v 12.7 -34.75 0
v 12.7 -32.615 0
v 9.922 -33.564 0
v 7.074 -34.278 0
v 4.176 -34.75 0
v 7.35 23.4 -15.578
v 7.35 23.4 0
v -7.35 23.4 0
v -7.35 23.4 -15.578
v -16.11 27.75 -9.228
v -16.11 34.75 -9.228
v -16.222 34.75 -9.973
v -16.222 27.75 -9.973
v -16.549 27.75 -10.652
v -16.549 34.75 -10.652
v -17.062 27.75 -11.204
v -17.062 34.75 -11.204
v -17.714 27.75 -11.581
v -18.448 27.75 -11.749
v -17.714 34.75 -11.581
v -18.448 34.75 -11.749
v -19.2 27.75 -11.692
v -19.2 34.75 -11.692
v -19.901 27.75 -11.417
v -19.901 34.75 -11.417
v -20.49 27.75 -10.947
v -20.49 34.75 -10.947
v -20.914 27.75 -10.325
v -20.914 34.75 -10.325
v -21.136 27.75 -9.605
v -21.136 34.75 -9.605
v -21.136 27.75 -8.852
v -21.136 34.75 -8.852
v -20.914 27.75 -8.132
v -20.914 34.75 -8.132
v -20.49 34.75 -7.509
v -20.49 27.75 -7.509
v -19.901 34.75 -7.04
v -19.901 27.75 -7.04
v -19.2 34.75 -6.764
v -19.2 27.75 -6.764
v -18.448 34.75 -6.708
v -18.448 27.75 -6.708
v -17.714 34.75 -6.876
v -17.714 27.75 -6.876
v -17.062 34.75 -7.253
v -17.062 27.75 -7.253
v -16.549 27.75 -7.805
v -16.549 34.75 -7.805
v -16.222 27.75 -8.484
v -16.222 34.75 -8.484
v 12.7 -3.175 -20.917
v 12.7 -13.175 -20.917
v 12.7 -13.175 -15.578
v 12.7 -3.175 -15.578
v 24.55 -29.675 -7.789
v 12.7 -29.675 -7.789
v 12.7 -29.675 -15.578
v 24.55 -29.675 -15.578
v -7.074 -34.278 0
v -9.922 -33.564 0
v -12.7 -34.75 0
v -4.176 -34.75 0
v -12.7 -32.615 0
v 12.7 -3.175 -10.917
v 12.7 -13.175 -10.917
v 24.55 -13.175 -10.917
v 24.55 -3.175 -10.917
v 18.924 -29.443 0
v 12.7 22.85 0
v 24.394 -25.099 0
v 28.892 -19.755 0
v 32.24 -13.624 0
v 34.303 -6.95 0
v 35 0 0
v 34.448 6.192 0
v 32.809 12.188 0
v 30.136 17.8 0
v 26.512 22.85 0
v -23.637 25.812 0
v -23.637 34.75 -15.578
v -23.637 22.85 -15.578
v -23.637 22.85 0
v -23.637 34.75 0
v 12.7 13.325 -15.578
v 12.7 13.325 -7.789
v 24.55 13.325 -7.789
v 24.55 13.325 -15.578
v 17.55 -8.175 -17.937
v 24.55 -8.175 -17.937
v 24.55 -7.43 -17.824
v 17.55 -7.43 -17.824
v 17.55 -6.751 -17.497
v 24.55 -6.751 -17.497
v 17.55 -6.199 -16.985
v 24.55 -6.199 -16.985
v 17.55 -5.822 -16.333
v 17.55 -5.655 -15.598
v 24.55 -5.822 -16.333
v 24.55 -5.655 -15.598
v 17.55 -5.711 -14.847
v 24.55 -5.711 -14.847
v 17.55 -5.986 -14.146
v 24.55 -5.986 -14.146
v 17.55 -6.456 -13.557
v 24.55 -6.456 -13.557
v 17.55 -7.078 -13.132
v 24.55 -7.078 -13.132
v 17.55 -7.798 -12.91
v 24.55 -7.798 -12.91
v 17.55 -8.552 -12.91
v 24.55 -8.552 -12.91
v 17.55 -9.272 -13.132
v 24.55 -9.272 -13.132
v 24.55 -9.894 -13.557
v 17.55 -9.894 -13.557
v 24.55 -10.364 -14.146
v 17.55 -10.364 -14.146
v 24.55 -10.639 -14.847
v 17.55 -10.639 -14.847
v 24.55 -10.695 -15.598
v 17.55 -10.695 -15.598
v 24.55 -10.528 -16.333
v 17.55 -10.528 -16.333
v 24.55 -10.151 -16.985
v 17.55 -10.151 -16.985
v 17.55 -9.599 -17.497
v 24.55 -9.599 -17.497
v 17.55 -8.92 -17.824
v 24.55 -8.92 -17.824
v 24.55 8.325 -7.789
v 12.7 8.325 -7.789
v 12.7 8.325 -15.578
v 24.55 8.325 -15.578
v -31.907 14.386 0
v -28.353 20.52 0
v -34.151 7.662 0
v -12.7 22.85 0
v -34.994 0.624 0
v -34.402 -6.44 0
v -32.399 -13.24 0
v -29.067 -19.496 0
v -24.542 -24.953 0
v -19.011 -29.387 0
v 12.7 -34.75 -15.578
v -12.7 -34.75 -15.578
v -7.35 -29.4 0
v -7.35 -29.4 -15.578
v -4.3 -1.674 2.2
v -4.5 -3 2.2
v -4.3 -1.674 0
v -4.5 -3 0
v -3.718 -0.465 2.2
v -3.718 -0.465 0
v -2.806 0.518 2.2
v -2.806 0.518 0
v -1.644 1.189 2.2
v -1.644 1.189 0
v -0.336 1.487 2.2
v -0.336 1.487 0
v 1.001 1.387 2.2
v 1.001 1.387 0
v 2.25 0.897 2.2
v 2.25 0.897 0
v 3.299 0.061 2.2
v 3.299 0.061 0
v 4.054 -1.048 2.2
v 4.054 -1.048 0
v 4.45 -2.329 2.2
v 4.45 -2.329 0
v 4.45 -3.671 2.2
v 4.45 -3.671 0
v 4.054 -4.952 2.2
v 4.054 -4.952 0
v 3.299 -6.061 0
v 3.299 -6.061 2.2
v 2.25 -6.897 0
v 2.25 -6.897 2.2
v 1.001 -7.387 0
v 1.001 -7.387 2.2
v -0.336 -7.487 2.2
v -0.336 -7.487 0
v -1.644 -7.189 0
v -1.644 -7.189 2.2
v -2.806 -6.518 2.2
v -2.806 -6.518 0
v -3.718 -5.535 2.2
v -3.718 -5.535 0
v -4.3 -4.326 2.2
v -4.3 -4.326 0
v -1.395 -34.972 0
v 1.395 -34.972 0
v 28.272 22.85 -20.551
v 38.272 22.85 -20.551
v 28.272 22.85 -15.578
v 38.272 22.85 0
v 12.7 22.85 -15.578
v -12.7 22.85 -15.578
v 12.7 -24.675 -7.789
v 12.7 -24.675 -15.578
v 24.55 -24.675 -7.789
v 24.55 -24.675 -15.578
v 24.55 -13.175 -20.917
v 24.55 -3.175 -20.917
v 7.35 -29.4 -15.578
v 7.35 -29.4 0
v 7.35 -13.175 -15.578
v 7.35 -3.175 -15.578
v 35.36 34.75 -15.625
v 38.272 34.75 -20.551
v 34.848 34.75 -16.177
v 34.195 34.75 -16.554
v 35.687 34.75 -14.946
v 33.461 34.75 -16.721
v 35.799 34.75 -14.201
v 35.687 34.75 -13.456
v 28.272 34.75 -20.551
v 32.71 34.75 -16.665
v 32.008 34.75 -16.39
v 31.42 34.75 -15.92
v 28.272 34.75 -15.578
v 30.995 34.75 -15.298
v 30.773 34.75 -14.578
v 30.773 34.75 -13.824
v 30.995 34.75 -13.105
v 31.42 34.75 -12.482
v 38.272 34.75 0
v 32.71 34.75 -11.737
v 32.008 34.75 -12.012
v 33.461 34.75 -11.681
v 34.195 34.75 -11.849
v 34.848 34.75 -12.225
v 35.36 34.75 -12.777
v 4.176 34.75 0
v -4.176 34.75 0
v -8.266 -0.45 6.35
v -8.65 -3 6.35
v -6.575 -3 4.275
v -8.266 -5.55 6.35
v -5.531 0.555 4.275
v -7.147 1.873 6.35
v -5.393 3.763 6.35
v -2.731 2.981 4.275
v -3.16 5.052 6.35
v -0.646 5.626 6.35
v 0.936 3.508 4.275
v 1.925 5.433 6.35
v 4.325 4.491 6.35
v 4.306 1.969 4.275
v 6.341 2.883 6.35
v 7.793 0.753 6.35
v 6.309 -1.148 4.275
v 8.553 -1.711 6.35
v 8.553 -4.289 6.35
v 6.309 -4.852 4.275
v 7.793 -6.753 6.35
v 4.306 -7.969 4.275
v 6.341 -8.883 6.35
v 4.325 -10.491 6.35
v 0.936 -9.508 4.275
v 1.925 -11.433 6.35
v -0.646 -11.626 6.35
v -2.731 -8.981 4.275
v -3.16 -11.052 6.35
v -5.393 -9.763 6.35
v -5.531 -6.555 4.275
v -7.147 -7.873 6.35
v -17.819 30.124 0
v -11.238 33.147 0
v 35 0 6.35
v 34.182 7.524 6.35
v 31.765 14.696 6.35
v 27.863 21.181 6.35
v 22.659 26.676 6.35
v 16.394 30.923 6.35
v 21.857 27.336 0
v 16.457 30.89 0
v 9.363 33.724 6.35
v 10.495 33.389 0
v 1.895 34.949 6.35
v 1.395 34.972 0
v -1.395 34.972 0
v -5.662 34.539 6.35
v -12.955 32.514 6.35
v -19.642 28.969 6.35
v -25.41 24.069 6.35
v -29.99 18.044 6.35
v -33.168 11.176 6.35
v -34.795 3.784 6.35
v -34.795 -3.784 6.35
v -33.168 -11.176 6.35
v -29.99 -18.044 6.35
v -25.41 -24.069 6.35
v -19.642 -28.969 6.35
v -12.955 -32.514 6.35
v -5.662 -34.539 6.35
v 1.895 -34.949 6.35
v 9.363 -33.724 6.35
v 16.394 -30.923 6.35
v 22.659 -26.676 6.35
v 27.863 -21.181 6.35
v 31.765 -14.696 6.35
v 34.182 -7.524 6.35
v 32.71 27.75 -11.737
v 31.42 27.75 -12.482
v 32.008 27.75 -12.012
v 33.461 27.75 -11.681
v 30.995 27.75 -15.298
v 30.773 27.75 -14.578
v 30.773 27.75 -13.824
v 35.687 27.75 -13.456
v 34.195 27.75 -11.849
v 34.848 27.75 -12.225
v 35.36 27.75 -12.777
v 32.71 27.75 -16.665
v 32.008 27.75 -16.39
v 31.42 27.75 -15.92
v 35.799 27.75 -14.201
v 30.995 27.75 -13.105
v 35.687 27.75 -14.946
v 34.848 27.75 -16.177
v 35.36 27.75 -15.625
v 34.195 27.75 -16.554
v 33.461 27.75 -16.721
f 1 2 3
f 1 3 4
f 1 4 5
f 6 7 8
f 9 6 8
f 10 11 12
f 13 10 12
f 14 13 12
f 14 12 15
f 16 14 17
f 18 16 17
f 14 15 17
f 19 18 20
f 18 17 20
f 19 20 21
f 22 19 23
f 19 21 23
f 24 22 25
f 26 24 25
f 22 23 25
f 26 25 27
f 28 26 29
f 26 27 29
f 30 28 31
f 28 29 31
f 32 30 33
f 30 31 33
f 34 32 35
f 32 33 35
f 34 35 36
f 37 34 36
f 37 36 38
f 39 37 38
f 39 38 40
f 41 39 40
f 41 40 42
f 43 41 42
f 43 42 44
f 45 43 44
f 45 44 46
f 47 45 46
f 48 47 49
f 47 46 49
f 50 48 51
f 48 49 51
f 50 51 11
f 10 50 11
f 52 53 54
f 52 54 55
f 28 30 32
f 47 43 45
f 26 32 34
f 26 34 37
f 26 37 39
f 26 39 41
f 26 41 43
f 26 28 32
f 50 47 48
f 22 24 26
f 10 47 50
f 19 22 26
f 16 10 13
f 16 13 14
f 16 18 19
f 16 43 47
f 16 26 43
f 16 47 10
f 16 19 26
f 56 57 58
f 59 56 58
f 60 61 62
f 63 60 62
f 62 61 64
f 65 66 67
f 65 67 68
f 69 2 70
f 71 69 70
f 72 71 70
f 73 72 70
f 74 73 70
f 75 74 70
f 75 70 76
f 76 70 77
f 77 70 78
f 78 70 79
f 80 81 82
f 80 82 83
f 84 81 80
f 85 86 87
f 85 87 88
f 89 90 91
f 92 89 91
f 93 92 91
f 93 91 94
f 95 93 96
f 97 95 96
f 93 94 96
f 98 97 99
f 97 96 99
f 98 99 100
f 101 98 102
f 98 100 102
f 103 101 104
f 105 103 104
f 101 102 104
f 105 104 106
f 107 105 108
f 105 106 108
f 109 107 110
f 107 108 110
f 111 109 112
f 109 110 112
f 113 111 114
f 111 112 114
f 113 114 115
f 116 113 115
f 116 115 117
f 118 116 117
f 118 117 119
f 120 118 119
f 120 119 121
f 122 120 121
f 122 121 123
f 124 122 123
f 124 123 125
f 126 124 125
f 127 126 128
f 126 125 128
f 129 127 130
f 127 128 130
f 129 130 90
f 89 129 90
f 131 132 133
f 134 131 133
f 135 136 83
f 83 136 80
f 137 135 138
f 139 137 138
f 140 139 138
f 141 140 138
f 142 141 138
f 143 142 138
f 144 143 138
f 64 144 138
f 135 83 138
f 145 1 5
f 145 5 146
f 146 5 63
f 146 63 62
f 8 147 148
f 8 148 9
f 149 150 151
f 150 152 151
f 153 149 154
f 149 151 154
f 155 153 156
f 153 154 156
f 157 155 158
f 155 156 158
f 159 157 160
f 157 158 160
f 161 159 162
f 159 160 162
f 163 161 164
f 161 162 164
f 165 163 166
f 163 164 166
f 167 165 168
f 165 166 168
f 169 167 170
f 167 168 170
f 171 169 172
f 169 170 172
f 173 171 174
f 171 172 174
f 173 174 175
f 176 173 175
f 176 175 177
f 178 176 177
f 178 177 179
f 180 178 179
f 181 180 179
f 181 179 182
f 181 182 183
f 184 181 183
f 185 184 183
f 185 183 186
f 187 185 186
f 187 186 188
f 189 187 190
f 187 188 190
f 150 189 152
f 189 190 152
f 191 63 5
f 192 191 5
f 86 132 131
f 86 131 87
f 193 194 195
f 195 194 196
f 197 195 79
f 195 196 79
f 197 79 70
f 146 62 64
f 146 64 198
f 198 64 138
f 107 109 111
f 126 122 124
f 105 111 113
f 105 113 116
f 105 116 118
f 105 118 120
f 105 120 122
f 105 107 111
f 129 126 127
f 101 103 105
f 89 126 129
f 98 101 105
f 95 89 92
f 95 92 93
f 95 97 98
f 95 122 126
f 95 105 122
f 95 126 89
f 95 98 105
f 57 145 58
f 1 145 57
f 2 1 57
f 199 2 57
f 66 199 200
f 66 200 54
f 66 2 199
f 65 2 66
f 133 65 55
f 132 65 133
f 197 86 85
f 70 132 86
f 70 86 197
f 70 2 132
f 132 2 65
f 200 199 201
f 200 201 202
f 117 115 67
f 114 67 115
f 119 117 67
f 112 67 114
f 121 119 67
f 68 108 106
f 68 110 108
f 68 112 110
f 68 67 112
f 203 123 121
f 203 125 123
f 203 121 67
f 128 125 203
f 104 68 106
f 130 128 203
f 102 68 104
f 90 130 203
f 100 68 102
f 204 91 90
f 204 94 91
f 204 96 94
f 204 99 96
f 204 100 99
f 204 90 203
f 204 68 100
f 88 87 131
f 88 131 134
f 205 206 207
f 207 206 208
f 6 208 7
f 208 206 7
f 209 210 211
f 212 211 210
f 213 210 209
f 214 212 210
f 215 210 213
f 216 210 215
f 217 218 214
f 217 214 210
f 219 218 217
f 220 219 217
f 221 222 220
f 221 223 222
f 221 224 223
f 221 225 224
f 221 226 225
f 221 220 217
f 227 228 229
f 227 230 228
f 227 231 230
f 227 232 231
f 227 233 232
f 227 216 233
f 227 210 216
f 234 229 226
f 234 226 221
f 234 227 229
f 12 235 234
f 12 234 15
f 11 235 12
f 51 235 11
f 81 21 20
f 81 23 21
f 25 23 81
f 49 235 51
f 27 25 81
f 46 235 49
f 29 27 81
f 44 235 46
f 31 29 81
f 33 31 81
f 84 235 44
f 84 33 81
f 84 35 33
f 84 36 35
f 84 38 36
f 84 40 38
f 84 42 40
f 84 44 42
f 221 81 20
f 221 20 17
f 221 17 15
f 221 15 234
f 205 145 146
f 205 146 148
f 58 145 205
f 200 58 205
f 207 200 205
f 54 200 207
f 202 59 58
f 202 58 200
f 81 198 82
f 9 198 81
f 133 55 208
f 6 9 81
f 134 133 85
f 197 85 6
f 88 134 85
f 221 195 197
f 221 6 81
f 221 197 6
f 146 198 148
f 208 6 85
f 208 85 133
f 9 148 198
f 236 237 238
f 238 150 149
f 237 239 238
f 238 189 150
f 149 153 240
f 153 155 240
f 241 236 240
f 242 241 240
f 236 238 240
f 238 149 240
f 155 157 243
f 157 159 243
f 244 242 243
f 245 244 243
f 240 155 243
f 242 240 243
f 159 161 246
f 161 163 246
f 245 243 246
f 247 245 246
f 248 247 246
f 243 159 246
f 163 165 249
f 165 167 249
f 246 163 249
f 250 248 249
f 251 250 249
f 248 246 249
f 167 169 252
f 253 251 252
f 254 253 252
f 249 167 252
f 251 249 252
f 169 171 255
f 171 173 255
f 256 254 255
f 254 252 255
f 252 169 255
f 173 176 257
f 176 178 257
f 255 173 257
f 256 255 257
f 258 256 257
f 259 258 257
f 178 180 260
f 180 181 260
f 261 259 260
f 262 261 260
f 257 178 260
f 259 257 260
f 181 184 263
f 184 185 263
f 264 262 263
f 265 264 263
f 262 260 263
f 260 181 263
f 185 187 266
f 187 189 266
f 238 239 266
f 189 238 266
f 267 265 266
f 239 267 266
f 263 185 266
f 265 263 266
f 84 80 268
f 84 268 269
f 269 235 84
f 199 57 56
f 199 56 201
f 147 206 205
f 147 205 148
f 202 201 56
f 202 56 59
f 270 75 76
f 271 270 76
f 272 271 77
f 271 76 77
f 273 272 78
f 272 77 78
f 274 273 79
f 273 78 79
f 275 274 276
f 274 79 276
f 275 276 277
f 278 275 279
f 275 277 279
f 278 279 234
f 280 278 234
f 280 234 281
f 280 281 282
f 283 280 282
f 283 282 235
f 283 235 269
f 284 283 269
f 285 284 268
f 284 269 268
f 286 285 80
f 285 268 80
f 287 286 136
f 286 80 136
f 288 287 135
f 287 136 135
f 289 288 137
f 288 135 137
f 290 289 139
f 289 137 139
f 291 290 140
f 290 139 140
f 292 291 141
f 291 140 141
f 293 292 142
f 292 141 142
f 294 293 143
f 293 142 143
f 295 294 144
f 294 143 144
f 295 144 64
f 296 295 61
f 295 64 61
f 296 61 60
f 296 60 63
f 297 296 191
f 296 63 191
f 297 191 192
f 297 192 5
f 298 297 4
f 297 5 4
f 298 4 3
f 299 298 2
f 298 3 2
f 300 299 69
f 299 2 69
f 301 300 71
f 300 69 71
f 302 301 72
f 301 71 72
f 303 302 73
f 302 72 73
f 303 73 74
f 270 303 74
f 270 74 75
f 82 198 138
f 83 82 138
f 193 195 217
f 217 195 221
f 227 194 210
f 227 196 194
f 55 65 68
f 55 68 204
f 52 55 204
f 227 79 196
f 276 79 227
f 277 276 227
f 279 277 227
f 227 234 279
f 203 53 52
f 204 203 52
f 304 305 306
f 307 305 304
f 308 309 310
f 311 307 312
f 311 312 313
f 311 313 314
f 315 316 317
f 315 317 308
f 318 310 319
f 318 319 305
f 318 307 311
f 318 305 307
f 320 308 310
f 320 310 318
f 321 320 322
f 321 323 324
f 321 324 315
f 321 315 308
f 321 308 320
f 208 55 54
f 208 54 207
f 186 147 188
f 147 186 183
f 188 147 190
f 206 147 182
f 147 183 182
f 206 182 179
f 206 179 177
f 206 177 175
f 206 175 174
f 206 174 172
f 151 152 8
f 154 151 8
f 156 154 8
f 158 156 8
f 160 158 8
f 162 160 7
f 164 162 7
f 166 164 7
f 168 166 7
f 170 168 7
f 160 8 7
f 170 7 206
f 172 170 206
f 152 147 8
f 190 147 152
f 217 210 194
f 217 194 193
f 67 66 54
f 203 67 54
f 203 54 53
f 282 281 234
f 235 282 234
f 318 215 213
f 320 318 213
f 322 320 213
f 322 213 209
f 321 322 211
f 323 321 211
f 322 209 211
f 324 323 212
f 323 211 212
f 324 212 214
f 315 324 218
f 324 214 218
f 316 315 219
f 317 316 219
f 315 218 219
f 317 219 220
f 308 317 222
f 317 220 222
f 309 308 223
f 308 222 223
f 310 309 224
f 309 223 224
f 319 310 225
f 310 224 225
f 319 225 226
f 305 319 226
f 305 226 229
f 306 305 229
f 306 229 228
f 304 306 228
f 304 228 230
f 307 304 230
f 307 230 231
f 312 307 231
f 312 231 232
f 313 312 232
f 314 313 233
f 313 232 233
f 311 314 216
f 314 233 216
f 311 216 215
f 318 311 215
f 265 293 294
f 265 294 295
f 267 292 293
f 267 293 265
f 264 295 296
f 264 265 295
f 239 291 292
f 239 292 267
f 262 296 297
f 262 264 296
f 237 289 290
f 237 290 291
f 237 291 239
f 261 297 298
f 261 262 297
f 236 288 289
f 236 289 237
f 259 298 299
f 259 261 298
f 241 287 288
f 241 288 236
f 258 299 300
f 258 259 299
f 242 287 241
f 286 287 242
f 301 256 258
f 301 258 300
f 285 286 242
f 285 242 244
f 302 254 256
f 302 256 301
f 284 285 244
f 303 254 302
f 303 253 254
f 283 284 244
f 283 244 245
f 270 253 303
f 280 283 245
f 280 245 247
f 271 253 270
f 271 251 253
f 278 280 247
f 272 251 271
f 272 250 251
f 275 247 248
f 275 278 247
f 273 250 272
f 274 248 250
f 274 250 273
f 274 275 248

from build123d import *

# Parameters (mm, degrees)
SKETCH1_R                                       = 35
BOSS_EXTRUDE1_DEPTH                             = 6.35
SKETCH2_W                                       = 25.4
SKETCH2_H                                       = 69.5
SKETCH2_W_2                                     = 14.7
SKETCH2_H_2                                     = 52.8
BOSS_EXTRUDE2_DEPTH                             = 15.578435
CSK_FOR_M8_FLAT_HEAD_MACHINE_SCREW1_D           = 9
CSK_FOR_M8_FLAT_HEAD_MACHINE_SCREW1_DEPTH       = 17.5
CSK_FOR_M8_FLAT_HEAD_MACHINE_SCREW1_CSINK_D     = 17.3
CSK_FOR_M8_FLAT_HEAD_MACHINE_SCREW1_CSINK_ANGLE = 90
CSK_FOR_M8_FLAT_HEAD_MACHINE_SCREW1_TIP         = 2.703872786
SKETCH6_W                                       = 15.578435
SKETCH6_H                                       = 11.9
BOSS_EXTRUDE3_DEPTH                             = 25.572145
SKETCH7_W                                       = 15.578435
SKETCH7_H                                       = 11.9
BOSS_EXTRUDE4_DEPTH                             = 10.937286
SKETCH8_R                                       = 2.5273
CUT_EXTRUDE1_DEPTH                              = 7
SKETCH9_W                                       = 10
SKETCH9_H                                       = 11.9
BOSS_EXTRUDE5_DEPTH                             = 4.972688
SKETCH10_R                                      = 2.5273
CUT_EXTRUDE2_DEPTH                              = 7
SKETCH11_W                                      = 5.3384196
SKETCH11_H                                      = 10
BOSS_EXTRUDE6_DEPTH                             = 5.35
SKETCH12_W                                      = 10
SKETCH12_H                                      = 10
SKETCH12_W_2                                    = 7.789222
SKETCH12_H_2                                    = 5
BOSS_EXTRUDE7_DEPTH                             = 11.85
SKETCH13_R                                      = 2.5273
CUT_EXTRUDE3_DEPTH                              = 7
SKETCH14_W                                      = 5.35
SKETCH14_H                                      = 10
CUT_EXTRUDE4_DEPTH                              = 5.33842


with BuildPart() as part:
    # Sketch1 → Boss-Extrude1 (new body)
    with BuildSketch(Plane.XY):
        Circle(SKETCH1_R)
    extrude(amount=BOSS_EXTRUDE1_DEPTH)

    # Sketch2 → Boss-Extrude2 (add)
    with BuildSketch(Plane(origin=(0, 0, 0), x_dir=(-1, 0, 0), z_dir=(0, 0, -1))):
        Rectangle(SKETCH2_W, SKETCH2_H)
        with Locations((0, -3)):
            Rectangle(SKETCH2_W_2, SKETCH2_H_2, mode=Mode.SUBTRACT)
    extrude(amount=BOSS_EXTRUDE2_DEPTH)

    # CSK for M8 Flat Head Machine Screw1
    with Locations(Plane.XY.offset(6.35)):
        with Locations((0, -3)):
            CounterSinkHole(CSK_FOR_M8_FLAT_HEAD_MACHINE_SCREW1_D / 2, CSK_FOR_M8_FLAT_HEAD_MACHINE_SCREW1_CSINK_D / 2, depth=CSK_FOR_M8_FLAT_HEAD_MACHINE_SCREW1_DEPTH, counter_sink_angle=CSK_FOR_M8_FLAT_HEAD_MACHINE_SCREW1_CSINK_ANGLE)
            with Locations((0, 0, -(CSK_FOR_M8_FLAT_HEAD_MACHINE_SCREW1_DEPTH + CSK_FOR_M8_FLAT_HEAD_MACHINE_SCREW1_TIP / 2))):  # 118° drill point
                Cone(0, CSK_FOR_M8_FLAT_HEAD_MACHINE_SCREW1_D / 2, CSK_FOR_M8_FLAT_HEAD_MACHINE_SCREW1_TIP, mode=Mode.SUBTRACT)

    # Sketch6 → Boss-Extrude3 (add)
    with BuildSketch(Plane(origin=(12.7, 0, 0), x_dir=(0, 0, -1), z_dir=(1, 0, 0))):
        with Locations((7.7892175, 28.8)):
            Rectangle(SKETCH6_W, SKETCH6_H)
    extrude(amount=BOSS_EXTRUDE3_DEPTH)

    # Sketch7 → Boss-Extrude4 (add)
    with BuildSketch(Plane.ZY.offset(12.7)):
        with Locations((-7.7892175, 28.8)):
            Rectangle(SKETCH7_W, SKETCH7_H)
    extrude(amount=BOSS_EXTRUDE4_DEPTH)

    # Sketch8 → Cut-Extrude1 (cut)
    with BuildSketch(Plane(origin=(0, 34.75, 0), x_dir=(1, 0, 0), z_dir=(0, 1, 0))):
        with Locations((-18.637286, 9.228435)):
            Circle(SKETCH8_R)
    extrude(amount=-CUT_EXTRUDE1_DEPTH, mode=Mode.SUBTRACT)

    # Sketch9 → Boss-Extrude5 (add)
    with BuildSketch(Plane(origin=(0, 0, -15.578435), x_dir=(-1, 0, 0), z_dir=(0, 0, -1))):
        with Locations((-33.272145, 28.8)):
            Rectangle(SKETCH9_W, SKETCH9_H)
    extrude(amount=BOSS_EXTRUDE5_DEPTH)

    # Sketch10 → Cut-Extrude2 (cut)
    with BuildSketch(Plane(origin=(0, 34.75, 0), x_dir=(1, 0, 0), z_dir=(0, 1, 0))):
        with Locations((33.272145, 14.201123)):
            Circle(SKETCH10_R)
    extrude(amount=-CUT_EXTRUDE2_DEPTH, mode=Mode.SUBTRACT)

    # Sketch11 → Boss-Extrude6 (add)
    with BuildSketch(Plane(origin=(12.7, 0, 0), x_dir=(0, 0, -1), z_dir=(1, 0, 0))):
        with Locations((18.2476448, -8.175)):
            Rectangle(SKETCH11_W, SKETCH11_H)
    extrude(amount=-BOSS_EXTRUDE6_DEPTH)

    # Sketch12 → Boss-Extrude7 (add)
    with BuildSketch(Plane(origin=(12.7, 0, 0), x_dir=(0, 0, -1), z_dir=(1, 0, 0))):
        with Locations((15.9168546, -8.175)):
            Rectangle(SKETCH12_W, SKETCH12_H)
        with Locations((11.683824, 10.825)):
            Rectangle(SKETCH12_W_2, SKETCH12_H_2)
        with Locations((11.683824, -27.175)):
            Rectangle(SKETCH12_W_2, SKETCH12_H_2)
    extrude(amount=BOSS_EXTRUDE7_DEPTH)

    # Sketch13 → Cut-Extrude3 (cut)
    with BuildSketch(Plane(origin=(24.55, 0, 0), x_dir=(0, 0, -1), z_dir=(1, 0, 0))):
        with Locations((15.4092126, -8.175)):
            Circle(SKETCH13_R)
    extrude(amount=-CUT_EXTRUDE3_DEPTH, mode=Mode.SUBTRACT)

    # Sketch14 → Cut-Extrude4 (cut)
    with BuildSketch(Plane(origin=(0, 0, -20.9168546), x_dir=(-1, 0, 0), z_dir=(0, 0, -1))):
        with Locations((-10.025, -8.175)):
            Rectangle(SKETCH14_W, SKETCH14_H)
    extrude(amount=-CUT_EXTRUDE4_DEPTH, mode=Mode.SUBTRACT)


solid = part.part
